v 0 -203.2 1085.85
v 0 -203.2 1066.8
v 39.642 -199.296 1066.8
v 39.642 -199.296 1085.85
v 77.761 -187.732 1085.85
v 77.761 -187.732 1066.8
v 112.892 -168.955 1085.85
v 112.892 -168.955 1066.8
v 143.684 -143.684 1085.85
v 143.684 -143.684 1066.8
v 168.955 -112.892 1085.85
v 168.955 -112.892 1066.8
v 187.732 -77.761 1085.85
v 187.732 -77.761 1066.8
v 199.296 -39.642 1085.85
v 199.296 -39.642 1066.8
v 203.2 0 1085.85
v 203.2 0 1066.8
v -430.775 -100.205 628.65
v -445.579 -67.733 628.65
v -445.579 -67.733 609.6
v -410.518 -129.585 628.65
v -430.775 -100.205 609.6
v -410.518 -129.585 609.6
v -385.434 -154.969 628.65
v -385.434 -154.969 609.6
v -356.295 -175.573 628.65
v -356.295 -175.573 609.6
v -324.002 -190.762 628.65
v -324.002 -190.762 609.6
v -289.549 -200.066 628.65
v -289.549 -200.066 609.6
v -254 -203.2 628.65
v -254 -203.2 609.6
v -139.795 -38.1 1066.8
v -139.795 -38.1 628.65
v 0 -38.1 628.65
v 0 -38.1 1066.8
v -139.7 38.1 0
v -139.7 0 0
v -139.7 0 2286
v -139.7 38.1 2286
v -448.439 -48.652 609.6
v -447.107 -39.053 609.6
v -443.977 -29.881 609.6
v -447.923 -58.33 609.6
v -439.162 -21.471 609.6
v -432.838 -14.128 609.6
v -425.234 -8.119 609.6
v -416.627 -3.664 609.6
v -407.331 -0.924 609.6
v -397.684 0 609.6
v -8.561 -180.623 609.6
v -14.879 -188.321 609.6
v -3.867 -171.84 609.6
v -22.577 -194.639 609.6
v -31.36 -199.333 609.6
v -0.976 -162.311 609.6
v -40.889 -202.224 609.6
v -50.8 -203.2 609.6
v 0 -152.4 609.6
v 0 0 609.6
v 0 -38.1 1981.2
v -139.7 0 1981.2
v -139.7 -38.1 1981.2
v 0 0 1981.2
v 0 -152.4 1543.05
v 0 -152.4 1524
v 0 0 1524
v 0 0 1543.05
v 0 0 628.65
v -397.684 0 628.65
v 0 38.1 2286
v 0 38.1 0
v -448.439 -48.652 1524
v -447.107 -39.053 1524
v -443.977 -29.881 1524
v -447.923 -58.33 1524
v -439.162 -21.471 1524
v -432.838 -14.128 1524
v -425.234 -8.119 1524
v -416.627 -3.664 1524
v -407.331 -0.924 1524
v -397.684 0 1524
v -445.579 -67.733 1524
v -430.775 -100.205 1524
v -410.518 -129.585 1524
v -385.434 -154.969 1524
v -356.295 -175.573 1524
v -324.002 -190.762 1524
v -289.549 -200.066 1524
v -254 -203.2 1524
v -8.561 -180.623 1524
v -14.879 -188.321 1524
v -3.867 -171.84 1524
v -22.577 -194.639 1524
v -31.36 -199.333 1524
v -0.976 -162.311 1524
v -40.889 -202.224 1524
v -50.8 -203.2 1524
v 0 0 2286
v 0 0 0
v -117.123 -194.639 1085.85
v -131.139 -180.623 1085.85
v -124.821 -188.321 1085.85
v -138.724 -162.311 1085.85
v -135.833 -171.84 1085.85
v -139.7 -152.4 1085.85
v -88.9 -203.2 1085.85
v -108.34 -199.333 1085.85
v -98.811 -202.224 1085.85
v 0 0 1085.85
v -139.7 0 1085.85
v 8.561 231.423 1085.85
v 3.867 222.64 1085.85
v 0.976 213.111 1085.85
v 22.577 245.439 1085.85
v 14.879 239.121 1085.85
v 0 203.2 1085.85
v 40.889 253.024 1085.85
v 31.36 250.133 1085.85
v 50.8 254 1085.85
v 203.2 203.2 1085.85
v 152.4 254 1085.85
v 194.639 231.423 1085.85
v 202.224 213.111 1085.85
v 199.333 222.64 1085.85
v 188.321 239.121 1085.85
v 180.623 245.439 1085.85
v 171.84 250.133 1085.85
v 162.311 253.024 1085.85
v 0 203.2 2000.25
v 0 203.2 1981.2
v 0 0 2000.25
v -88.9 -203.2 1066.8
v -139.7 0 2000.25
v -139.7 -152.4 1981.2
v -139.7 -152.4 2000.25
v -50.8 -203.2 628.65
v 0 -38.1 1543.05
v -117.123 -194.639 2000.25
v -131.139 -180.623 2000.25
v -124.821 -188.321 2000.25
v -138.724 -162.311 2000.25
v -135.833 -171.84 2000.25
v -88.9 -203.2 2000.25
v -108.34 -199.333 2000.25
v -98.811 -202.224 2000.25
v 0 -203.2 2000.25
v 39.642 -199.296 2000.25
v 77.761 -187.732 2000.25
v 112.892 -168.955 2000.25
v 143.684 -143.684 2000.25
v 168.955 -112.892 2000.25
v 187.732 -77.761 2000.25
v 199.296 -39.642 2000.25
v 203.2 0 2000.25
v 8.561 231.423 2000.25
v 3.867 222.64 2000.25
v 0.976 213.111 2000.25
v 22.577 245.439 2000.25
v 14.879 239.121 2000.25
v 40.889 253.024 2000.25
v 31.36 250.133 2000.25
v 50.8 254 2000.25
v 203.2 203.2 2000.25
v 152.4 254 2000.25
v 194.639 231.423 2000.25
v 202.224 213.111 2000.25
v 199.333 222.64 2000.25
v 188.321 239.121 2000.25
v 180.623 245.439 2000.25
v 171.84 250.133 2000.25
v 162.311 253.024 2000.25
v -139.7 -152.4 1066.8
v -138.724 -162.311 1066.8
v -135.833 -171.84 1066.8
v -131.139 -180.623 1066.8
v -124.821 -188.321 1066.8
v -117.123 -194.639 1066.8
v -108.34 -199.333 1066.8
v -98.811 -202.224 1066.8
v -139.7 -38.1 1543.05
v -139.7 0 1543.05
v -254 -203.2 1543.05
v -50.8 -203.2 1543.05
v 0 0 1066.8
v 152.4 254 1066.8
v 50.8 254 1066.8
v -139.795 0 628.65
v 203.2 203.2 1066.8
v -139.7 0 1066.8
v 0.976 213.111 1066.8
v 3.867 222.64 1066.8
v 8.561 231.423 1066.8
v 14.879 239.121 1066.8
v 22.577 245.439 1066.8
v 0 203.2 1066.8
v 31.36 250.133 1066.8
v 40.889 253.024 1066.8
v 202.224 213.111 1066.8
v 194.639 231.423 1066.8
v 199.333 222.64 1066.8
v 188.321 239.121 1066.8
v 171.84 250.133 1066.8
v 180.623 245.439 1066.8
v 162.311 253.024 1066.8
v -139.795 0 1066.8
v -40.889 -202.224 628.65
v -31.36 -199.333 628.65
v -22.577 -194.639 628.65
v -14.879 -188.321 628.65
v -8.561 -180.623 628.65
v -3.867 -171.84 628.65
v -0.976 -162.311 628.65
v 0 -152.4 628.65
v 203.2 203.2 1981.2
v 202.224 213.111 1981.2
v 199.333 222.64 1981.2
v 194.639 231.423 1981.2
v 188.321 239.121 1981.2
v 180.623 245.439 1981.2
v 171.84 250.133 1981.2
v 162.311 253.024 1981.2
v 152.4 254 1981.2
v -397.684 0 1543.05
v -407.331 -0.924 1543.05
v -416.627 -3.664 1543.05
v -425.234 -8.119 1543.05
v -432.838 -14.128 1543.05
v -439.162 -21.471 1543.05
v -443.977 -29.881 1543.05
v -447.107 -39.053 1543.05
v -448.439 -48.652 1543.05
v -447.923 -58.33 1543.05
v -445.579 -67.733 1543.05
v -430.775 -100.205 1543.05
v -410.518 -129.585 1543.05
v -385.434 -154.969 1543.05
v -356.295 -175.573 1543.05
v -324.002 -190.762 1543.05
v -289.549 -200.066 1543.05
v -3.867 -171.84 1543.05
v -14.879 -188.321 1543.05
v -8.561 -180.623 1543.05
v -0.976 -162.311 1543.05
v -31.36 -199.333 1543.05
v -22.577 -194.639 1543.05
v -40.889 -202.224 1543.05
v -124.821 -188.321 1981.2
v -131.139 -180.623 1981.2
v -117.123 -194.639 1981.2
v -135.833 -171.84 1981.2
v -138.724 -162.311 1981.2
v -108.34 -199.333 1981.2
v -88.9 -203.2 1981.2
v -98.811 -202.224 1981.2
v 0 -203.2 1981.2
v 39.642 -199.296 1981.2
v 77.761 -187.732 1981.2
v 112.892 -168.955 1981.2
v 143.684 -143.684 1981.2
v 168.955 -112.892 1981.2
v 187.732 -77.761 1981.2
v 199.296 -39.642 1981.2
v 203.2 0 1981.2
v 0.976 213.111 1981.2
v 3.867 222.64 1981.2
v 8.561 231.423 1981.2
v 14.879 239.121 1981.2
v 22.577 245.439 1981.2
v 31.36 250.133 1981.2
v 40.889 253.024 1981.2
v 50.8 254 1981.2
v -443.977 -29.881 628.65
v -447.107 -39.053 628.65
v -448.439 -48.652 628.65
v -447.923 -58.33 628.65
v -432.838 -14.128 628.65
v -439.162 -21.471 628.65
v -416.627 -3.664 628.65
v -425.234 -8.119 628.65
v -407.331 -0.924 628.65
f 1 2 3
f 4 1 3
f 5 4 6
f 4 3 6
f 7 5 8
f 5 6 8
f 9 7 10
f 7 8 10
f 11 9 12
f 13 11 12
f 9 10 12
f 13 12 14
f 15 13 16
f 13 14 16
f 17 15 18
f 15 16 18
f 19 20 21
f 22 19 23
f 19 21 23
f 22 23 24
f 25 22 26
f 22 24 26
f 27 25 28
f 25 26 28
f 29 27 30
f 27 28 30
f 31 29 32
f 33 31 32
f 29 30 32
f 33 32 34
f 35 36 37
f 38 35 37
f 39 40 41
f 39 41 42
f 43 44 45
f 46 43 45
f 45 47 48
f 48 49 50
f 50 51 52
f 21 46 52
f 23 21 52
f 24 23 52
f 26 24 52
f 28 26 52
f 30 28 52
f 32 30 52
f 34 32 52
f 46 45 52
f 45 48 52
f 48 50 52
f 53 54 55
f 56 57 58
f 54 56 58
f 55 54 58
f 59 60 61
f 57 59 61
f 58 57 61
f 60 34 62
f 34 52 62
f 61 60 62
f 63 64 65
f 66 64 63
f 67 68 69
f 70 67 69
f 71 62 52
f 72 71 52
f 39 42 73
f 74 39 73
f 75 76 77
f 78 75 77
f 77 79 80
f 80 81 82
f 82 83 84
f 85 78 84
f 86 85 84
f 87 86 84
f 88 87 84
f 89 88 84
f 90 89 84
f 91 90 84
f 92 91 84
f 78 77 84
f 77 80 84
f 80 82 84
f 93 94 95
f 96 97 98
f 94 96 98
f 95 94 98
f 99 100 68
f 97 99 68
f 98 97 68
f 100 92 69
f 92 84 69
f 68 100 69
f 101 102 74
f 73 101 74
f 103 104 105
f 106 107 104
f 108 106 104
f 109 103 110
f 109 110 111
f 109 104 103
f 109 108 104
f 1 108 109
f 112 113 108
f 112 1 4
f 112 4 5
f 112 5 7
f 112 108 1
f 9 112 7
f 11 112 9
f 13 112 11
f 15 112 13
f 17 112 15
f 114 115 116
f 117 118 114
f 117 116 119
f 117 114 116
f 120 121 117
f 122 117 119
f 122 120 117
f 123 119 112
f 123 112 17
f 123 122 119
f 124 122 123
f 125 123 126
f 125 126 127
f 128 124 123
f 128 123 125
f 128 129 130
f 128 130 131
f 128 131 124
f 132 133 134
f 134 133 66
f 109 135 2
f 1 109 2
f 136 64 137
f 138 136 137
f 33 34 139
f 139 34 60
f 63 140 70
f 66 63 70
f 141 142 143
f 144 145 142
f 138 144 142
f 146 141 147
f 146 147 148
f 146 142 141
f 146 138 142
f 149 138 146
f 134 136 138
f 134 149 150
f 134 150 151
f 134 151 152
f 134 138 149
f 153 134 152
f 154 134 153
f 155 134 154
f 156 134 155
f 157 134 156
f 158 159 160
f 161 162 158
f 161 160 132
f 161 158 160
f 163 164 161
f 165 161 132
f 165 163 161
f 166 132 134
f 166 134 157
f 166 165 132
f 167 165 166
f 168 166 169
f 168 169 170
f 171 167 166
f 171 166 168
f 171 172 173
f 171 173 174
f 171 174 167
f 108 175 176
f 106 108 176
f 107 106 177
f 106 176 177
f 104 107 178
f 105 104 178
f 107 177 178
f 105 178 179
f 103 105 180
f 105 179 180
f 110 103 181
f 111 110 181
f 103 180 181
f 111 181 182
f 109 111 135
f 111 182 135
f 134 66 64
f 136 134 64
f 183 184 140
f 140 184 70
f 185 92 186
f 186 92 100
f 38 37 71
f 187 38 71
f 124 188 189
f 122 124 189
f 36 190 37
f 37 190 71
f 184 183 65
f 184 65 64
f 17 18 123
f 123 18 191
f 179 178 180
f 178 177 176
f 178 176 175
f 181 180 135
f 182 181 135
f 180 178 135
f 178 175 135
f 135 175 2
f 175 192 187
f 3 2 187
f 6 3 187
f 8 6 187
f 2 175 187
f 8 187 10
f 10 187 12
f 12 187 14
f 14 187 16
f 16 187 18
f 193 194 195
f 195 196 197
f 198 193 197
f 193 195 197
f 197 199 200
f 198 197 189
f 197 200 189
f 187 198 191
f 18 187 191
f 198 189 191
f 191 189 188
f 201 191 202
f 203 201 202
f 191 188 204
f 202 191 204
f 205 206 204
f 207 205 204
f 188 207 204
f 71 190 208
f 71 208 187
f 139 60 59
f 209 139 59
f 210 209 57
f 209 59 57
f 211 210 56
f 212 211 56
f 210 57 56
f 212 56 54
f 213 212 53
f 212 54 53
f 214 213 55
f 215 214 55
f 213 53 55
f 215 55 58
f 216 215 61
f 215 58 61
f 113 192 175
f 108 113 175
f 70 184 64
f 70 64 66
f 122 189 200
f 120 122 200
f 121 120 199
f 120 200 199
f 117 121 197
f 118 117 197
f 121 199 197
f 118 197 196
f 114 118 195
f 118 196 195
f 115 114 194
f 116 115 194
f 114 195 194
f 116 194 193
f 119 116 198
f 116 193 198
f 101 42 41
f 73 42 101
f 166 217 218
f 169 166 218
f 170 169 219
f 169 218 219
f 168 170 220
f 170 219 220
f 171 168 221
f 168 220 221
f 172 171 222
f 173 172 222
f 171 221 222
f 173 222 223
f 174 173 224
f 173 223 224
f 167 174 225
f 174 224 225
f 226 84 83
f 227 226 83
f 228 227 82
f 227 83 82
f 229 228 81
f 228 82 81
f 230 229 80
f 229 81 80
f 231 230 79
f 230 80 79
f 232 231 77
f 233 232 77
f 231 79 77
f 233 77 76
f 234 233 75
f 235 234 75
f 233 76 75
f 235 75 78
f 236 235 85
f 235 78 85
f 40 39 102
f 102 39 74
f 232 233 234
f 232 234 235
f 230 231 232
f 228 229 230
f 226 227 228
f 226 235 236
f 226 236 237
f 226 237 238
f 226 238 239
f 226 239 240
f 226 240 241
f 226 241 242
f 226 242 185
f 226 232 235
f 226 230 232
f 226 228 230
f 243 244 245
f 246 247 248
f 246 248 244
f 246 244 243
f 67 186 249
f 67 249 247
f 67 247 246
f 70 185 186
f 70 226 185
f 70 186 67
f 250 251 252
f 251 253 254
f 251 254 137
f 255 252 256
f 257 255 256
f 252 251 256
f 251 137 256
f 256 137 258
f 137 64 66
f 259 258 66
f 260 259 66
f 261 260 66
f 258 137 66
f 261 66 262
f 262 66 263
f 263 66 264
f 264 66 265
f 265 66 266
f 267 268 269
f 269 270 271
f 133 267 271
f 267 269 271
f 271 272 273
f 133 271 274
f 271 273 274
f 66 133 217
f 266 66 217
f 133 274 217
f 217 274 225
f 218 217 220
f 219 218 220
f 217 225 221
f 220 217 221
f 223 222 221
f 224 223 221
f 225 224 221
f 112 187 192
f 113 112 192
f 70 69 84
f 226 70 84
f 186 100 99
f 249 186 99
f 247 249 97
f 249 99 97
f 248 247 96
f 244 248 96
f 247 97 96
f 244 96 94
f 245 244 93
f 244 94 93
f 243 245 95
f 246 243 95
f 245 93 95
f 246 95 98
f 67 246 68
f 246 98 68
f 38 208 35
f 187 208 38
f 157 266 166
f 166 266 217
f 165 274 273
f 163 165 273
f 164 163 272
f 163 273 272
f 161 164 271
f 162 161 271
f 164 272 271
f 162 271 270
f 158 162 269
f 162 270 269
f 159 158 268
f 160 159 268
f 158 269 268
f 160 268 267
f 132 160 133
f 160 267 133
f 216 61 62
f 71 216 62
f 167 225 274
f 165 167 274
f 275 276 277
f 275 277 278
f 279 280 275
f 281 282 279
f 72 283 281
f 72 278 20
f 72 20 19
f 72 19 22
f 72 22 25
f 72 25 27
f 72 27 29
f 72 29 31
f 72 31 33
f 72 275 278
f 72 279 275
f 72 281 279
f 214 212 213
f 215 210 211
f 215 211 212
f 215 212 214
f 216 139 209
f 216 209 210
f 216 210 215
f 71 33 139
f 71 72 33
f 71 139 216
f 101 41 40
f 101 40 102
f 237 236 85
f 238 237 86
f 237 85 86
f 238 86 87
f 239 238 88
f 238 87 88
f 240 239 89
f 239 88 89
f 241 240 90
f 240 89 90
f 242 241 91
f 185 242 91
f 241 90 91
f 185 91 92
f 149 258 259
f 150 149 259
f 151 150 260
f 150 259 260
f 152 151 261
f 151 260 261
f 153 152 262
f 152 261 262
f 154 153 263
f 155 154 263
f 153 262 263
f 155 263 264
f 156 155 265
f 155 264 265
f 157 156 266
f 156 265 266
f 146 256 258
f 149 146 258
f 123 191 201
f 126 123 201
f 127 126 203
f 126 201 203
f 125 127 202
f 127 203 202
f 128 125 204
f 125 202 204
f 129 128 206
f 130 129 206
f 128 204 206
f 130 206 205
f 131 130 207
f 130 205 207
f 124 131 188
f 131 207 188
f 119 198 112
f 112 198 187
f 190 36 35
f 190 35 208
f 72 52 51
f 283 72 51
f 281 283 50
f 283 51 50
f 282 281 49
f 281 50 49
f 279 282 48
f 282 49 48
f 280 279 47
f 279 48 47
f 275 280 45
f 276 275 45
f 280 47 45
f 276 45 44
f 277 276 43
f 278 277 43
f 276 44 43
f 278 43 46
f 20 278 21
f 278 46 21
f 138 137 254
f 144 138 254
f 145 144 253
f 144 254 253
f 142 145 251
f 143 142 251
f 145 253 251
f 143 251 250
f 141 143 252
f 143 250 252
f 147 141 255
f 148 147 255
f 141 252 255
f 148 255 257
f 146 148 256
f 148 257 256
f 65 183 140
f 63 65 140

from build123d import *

# Parameters (mm, degrees)
F4_W      = 139.7
F4_H      = 38.1
F5_DEPTH  = 2286
F7_DEPTH  = 19.05
F9_DEPTH  = 19.05
F11_DEPTH = 19.05
F13_DEPTH = 19.05
F14_W     = 139.794812
F14_H     = 38.1
F15_DEPTH = 438.15
F16_W     = 139.7
F16_H     = 38.1
F17_DEPTH = 438.15


with BuildPart() as f5:
    # F4 (on Top) → F5 (new body)
    with BuildSketch(Plane.XY):
        with Locations((-69.85, 19.05)):
            Rectangle(F4_W, F4_H)
    extrude(amount=F5_DEPTH)


with BuildPart() as f7:
    # F6 (on offset) → F7 (new body)
    with BuildSketch(Plane.XY.offset(609.6)):
        with BuildLine():
            Line((0, -152.4), (0, 0))
            Line((0, 0), (-254, 0))
            Line((-254, 0), (-397.684098, 0))
            ThreePointArc((-397.684098, 0), (-439.162124, -21.470606), (-445.578797, -67.733333))
            ThreePointArc((-445.578797, -67.733333), (-371.317575, -165.912105), (-254, -203.2))
            Line((-254, -203.2), (-50.8, -203.2))
            ThreePointArc((-50.8, -203.2), (-14.878976, -188.321024), (0, -152.4))
        make_face()
    extrude(amount=F7_DEPTH)


with BuildPart() as f9:
    # F8 (on offset) → F9 (new body)
    with BuildSketch(Plane.XY.offset(1066.8)):
        with BuildLine():
            Line((0, 0), (-139.7, 0))
            Line((-139.7, 0), (-139.7, -152.4))
            ThreePointArc((-139.7, -152.4), (-124.821024, -188.321024), (-88.9, -203.2))
            Line((-88.9, -203.2), (0, -203.2))
            ThreePointArc((0, -203.2), (143.684098, -143.684098), (203.2, 0))
            Line((203.2, 0), (203.2, 203.2))
            ThreePointArc((203.2, 203.2), (188.321024, 239.121024), (152.4, 254))
            Line((152.4, 254), (50.8, 254))
            ThreePointArc((50.8, 254), (14.878976, 239.121024), (0, 203.2))
            Line((0, 203.2), (0, 0))
        make_face()
    extrude(amount=F9_DEPTH)


with BuildPart() as f11:
    # F10 (on offset) → F11 (new body)
    with BuildSketch(Plane.XY.offset(1524)):
        with BuildLine():
            Line((0, -152.4), (0, 0))
            Line((0, 0), (-254, 0))
            Line((-254, 0), (-397.684098, 0))
            ThreePointArc((-397.684098, 0), (-439.162124, -21.470606), (-445.578797, -67.733333))
            ThreePointArc((-445.578797, -67.733333), (-371.317575, -165.912105), (-254, -203.2))
            Line((-254, -203.2), (-50.8, -203.2))
            ThreePointArc((-50.8, -203.2), (-14.878976, -188.321024), (0, -152.4))
        make_face()
    extrude(amount=F11_DEPTH)


with BuildPart() as f13:
    # F12 (on offset) → F13 (new body)
    with BuildSketch(Plane.XY.offset(1981.2)):
        with BuildLine():
            Line((0, 0), (-139.7, 0))
            Line((-139.7, 0), (-139.7, -152.4))
            ThreePointArc((-139.7, -152.4), (-124.821024, -188.321024), (-88.9, -203.2))
            Line((-88.9, -203.2), (0, -203.2))
            ThreePointArc((0, -203.2), (143.684098, -143.684098), (203.2, 0))
            Line((203.2, 0), (203.2, 203.2))
            ThreePointArc((203.2, 203.2), (188.321024, 239.121024), (152.4, 254))
            Line((152.4, 254), (50.8, 254))
            ThreePointArc((50.8, 254), (14.878976, 239.121024), (0, 203.2))
            Line((0, 203.2), (0, 0))
        make_face()
    extrude(amount=F13_DEPTH)


with BuildPart() as f15:
    # F14 (on face) → F15 (new body)
    with BuildSketch(Plane.XY.offset(628.65)):
        with Locations((-69.897406, -19.05)):
            Rectangle(F14_W, F14_H)
    extrude(amount=F15_DEPTH)


with BuildPart() as f17:
    # F16 (on face) → F17 (new body)
    with BuildSketch(Plane.XY.offset(1543.05)):
        with Locations((-69.85, -19.05)):
            Rectangle(F16_W, F16_H)
    extrude(amount=F17_DEPTH)


solid = Compound([f5.part, f7.part, f9.part, f11.part, f13.part, f15.part, f17.part])
